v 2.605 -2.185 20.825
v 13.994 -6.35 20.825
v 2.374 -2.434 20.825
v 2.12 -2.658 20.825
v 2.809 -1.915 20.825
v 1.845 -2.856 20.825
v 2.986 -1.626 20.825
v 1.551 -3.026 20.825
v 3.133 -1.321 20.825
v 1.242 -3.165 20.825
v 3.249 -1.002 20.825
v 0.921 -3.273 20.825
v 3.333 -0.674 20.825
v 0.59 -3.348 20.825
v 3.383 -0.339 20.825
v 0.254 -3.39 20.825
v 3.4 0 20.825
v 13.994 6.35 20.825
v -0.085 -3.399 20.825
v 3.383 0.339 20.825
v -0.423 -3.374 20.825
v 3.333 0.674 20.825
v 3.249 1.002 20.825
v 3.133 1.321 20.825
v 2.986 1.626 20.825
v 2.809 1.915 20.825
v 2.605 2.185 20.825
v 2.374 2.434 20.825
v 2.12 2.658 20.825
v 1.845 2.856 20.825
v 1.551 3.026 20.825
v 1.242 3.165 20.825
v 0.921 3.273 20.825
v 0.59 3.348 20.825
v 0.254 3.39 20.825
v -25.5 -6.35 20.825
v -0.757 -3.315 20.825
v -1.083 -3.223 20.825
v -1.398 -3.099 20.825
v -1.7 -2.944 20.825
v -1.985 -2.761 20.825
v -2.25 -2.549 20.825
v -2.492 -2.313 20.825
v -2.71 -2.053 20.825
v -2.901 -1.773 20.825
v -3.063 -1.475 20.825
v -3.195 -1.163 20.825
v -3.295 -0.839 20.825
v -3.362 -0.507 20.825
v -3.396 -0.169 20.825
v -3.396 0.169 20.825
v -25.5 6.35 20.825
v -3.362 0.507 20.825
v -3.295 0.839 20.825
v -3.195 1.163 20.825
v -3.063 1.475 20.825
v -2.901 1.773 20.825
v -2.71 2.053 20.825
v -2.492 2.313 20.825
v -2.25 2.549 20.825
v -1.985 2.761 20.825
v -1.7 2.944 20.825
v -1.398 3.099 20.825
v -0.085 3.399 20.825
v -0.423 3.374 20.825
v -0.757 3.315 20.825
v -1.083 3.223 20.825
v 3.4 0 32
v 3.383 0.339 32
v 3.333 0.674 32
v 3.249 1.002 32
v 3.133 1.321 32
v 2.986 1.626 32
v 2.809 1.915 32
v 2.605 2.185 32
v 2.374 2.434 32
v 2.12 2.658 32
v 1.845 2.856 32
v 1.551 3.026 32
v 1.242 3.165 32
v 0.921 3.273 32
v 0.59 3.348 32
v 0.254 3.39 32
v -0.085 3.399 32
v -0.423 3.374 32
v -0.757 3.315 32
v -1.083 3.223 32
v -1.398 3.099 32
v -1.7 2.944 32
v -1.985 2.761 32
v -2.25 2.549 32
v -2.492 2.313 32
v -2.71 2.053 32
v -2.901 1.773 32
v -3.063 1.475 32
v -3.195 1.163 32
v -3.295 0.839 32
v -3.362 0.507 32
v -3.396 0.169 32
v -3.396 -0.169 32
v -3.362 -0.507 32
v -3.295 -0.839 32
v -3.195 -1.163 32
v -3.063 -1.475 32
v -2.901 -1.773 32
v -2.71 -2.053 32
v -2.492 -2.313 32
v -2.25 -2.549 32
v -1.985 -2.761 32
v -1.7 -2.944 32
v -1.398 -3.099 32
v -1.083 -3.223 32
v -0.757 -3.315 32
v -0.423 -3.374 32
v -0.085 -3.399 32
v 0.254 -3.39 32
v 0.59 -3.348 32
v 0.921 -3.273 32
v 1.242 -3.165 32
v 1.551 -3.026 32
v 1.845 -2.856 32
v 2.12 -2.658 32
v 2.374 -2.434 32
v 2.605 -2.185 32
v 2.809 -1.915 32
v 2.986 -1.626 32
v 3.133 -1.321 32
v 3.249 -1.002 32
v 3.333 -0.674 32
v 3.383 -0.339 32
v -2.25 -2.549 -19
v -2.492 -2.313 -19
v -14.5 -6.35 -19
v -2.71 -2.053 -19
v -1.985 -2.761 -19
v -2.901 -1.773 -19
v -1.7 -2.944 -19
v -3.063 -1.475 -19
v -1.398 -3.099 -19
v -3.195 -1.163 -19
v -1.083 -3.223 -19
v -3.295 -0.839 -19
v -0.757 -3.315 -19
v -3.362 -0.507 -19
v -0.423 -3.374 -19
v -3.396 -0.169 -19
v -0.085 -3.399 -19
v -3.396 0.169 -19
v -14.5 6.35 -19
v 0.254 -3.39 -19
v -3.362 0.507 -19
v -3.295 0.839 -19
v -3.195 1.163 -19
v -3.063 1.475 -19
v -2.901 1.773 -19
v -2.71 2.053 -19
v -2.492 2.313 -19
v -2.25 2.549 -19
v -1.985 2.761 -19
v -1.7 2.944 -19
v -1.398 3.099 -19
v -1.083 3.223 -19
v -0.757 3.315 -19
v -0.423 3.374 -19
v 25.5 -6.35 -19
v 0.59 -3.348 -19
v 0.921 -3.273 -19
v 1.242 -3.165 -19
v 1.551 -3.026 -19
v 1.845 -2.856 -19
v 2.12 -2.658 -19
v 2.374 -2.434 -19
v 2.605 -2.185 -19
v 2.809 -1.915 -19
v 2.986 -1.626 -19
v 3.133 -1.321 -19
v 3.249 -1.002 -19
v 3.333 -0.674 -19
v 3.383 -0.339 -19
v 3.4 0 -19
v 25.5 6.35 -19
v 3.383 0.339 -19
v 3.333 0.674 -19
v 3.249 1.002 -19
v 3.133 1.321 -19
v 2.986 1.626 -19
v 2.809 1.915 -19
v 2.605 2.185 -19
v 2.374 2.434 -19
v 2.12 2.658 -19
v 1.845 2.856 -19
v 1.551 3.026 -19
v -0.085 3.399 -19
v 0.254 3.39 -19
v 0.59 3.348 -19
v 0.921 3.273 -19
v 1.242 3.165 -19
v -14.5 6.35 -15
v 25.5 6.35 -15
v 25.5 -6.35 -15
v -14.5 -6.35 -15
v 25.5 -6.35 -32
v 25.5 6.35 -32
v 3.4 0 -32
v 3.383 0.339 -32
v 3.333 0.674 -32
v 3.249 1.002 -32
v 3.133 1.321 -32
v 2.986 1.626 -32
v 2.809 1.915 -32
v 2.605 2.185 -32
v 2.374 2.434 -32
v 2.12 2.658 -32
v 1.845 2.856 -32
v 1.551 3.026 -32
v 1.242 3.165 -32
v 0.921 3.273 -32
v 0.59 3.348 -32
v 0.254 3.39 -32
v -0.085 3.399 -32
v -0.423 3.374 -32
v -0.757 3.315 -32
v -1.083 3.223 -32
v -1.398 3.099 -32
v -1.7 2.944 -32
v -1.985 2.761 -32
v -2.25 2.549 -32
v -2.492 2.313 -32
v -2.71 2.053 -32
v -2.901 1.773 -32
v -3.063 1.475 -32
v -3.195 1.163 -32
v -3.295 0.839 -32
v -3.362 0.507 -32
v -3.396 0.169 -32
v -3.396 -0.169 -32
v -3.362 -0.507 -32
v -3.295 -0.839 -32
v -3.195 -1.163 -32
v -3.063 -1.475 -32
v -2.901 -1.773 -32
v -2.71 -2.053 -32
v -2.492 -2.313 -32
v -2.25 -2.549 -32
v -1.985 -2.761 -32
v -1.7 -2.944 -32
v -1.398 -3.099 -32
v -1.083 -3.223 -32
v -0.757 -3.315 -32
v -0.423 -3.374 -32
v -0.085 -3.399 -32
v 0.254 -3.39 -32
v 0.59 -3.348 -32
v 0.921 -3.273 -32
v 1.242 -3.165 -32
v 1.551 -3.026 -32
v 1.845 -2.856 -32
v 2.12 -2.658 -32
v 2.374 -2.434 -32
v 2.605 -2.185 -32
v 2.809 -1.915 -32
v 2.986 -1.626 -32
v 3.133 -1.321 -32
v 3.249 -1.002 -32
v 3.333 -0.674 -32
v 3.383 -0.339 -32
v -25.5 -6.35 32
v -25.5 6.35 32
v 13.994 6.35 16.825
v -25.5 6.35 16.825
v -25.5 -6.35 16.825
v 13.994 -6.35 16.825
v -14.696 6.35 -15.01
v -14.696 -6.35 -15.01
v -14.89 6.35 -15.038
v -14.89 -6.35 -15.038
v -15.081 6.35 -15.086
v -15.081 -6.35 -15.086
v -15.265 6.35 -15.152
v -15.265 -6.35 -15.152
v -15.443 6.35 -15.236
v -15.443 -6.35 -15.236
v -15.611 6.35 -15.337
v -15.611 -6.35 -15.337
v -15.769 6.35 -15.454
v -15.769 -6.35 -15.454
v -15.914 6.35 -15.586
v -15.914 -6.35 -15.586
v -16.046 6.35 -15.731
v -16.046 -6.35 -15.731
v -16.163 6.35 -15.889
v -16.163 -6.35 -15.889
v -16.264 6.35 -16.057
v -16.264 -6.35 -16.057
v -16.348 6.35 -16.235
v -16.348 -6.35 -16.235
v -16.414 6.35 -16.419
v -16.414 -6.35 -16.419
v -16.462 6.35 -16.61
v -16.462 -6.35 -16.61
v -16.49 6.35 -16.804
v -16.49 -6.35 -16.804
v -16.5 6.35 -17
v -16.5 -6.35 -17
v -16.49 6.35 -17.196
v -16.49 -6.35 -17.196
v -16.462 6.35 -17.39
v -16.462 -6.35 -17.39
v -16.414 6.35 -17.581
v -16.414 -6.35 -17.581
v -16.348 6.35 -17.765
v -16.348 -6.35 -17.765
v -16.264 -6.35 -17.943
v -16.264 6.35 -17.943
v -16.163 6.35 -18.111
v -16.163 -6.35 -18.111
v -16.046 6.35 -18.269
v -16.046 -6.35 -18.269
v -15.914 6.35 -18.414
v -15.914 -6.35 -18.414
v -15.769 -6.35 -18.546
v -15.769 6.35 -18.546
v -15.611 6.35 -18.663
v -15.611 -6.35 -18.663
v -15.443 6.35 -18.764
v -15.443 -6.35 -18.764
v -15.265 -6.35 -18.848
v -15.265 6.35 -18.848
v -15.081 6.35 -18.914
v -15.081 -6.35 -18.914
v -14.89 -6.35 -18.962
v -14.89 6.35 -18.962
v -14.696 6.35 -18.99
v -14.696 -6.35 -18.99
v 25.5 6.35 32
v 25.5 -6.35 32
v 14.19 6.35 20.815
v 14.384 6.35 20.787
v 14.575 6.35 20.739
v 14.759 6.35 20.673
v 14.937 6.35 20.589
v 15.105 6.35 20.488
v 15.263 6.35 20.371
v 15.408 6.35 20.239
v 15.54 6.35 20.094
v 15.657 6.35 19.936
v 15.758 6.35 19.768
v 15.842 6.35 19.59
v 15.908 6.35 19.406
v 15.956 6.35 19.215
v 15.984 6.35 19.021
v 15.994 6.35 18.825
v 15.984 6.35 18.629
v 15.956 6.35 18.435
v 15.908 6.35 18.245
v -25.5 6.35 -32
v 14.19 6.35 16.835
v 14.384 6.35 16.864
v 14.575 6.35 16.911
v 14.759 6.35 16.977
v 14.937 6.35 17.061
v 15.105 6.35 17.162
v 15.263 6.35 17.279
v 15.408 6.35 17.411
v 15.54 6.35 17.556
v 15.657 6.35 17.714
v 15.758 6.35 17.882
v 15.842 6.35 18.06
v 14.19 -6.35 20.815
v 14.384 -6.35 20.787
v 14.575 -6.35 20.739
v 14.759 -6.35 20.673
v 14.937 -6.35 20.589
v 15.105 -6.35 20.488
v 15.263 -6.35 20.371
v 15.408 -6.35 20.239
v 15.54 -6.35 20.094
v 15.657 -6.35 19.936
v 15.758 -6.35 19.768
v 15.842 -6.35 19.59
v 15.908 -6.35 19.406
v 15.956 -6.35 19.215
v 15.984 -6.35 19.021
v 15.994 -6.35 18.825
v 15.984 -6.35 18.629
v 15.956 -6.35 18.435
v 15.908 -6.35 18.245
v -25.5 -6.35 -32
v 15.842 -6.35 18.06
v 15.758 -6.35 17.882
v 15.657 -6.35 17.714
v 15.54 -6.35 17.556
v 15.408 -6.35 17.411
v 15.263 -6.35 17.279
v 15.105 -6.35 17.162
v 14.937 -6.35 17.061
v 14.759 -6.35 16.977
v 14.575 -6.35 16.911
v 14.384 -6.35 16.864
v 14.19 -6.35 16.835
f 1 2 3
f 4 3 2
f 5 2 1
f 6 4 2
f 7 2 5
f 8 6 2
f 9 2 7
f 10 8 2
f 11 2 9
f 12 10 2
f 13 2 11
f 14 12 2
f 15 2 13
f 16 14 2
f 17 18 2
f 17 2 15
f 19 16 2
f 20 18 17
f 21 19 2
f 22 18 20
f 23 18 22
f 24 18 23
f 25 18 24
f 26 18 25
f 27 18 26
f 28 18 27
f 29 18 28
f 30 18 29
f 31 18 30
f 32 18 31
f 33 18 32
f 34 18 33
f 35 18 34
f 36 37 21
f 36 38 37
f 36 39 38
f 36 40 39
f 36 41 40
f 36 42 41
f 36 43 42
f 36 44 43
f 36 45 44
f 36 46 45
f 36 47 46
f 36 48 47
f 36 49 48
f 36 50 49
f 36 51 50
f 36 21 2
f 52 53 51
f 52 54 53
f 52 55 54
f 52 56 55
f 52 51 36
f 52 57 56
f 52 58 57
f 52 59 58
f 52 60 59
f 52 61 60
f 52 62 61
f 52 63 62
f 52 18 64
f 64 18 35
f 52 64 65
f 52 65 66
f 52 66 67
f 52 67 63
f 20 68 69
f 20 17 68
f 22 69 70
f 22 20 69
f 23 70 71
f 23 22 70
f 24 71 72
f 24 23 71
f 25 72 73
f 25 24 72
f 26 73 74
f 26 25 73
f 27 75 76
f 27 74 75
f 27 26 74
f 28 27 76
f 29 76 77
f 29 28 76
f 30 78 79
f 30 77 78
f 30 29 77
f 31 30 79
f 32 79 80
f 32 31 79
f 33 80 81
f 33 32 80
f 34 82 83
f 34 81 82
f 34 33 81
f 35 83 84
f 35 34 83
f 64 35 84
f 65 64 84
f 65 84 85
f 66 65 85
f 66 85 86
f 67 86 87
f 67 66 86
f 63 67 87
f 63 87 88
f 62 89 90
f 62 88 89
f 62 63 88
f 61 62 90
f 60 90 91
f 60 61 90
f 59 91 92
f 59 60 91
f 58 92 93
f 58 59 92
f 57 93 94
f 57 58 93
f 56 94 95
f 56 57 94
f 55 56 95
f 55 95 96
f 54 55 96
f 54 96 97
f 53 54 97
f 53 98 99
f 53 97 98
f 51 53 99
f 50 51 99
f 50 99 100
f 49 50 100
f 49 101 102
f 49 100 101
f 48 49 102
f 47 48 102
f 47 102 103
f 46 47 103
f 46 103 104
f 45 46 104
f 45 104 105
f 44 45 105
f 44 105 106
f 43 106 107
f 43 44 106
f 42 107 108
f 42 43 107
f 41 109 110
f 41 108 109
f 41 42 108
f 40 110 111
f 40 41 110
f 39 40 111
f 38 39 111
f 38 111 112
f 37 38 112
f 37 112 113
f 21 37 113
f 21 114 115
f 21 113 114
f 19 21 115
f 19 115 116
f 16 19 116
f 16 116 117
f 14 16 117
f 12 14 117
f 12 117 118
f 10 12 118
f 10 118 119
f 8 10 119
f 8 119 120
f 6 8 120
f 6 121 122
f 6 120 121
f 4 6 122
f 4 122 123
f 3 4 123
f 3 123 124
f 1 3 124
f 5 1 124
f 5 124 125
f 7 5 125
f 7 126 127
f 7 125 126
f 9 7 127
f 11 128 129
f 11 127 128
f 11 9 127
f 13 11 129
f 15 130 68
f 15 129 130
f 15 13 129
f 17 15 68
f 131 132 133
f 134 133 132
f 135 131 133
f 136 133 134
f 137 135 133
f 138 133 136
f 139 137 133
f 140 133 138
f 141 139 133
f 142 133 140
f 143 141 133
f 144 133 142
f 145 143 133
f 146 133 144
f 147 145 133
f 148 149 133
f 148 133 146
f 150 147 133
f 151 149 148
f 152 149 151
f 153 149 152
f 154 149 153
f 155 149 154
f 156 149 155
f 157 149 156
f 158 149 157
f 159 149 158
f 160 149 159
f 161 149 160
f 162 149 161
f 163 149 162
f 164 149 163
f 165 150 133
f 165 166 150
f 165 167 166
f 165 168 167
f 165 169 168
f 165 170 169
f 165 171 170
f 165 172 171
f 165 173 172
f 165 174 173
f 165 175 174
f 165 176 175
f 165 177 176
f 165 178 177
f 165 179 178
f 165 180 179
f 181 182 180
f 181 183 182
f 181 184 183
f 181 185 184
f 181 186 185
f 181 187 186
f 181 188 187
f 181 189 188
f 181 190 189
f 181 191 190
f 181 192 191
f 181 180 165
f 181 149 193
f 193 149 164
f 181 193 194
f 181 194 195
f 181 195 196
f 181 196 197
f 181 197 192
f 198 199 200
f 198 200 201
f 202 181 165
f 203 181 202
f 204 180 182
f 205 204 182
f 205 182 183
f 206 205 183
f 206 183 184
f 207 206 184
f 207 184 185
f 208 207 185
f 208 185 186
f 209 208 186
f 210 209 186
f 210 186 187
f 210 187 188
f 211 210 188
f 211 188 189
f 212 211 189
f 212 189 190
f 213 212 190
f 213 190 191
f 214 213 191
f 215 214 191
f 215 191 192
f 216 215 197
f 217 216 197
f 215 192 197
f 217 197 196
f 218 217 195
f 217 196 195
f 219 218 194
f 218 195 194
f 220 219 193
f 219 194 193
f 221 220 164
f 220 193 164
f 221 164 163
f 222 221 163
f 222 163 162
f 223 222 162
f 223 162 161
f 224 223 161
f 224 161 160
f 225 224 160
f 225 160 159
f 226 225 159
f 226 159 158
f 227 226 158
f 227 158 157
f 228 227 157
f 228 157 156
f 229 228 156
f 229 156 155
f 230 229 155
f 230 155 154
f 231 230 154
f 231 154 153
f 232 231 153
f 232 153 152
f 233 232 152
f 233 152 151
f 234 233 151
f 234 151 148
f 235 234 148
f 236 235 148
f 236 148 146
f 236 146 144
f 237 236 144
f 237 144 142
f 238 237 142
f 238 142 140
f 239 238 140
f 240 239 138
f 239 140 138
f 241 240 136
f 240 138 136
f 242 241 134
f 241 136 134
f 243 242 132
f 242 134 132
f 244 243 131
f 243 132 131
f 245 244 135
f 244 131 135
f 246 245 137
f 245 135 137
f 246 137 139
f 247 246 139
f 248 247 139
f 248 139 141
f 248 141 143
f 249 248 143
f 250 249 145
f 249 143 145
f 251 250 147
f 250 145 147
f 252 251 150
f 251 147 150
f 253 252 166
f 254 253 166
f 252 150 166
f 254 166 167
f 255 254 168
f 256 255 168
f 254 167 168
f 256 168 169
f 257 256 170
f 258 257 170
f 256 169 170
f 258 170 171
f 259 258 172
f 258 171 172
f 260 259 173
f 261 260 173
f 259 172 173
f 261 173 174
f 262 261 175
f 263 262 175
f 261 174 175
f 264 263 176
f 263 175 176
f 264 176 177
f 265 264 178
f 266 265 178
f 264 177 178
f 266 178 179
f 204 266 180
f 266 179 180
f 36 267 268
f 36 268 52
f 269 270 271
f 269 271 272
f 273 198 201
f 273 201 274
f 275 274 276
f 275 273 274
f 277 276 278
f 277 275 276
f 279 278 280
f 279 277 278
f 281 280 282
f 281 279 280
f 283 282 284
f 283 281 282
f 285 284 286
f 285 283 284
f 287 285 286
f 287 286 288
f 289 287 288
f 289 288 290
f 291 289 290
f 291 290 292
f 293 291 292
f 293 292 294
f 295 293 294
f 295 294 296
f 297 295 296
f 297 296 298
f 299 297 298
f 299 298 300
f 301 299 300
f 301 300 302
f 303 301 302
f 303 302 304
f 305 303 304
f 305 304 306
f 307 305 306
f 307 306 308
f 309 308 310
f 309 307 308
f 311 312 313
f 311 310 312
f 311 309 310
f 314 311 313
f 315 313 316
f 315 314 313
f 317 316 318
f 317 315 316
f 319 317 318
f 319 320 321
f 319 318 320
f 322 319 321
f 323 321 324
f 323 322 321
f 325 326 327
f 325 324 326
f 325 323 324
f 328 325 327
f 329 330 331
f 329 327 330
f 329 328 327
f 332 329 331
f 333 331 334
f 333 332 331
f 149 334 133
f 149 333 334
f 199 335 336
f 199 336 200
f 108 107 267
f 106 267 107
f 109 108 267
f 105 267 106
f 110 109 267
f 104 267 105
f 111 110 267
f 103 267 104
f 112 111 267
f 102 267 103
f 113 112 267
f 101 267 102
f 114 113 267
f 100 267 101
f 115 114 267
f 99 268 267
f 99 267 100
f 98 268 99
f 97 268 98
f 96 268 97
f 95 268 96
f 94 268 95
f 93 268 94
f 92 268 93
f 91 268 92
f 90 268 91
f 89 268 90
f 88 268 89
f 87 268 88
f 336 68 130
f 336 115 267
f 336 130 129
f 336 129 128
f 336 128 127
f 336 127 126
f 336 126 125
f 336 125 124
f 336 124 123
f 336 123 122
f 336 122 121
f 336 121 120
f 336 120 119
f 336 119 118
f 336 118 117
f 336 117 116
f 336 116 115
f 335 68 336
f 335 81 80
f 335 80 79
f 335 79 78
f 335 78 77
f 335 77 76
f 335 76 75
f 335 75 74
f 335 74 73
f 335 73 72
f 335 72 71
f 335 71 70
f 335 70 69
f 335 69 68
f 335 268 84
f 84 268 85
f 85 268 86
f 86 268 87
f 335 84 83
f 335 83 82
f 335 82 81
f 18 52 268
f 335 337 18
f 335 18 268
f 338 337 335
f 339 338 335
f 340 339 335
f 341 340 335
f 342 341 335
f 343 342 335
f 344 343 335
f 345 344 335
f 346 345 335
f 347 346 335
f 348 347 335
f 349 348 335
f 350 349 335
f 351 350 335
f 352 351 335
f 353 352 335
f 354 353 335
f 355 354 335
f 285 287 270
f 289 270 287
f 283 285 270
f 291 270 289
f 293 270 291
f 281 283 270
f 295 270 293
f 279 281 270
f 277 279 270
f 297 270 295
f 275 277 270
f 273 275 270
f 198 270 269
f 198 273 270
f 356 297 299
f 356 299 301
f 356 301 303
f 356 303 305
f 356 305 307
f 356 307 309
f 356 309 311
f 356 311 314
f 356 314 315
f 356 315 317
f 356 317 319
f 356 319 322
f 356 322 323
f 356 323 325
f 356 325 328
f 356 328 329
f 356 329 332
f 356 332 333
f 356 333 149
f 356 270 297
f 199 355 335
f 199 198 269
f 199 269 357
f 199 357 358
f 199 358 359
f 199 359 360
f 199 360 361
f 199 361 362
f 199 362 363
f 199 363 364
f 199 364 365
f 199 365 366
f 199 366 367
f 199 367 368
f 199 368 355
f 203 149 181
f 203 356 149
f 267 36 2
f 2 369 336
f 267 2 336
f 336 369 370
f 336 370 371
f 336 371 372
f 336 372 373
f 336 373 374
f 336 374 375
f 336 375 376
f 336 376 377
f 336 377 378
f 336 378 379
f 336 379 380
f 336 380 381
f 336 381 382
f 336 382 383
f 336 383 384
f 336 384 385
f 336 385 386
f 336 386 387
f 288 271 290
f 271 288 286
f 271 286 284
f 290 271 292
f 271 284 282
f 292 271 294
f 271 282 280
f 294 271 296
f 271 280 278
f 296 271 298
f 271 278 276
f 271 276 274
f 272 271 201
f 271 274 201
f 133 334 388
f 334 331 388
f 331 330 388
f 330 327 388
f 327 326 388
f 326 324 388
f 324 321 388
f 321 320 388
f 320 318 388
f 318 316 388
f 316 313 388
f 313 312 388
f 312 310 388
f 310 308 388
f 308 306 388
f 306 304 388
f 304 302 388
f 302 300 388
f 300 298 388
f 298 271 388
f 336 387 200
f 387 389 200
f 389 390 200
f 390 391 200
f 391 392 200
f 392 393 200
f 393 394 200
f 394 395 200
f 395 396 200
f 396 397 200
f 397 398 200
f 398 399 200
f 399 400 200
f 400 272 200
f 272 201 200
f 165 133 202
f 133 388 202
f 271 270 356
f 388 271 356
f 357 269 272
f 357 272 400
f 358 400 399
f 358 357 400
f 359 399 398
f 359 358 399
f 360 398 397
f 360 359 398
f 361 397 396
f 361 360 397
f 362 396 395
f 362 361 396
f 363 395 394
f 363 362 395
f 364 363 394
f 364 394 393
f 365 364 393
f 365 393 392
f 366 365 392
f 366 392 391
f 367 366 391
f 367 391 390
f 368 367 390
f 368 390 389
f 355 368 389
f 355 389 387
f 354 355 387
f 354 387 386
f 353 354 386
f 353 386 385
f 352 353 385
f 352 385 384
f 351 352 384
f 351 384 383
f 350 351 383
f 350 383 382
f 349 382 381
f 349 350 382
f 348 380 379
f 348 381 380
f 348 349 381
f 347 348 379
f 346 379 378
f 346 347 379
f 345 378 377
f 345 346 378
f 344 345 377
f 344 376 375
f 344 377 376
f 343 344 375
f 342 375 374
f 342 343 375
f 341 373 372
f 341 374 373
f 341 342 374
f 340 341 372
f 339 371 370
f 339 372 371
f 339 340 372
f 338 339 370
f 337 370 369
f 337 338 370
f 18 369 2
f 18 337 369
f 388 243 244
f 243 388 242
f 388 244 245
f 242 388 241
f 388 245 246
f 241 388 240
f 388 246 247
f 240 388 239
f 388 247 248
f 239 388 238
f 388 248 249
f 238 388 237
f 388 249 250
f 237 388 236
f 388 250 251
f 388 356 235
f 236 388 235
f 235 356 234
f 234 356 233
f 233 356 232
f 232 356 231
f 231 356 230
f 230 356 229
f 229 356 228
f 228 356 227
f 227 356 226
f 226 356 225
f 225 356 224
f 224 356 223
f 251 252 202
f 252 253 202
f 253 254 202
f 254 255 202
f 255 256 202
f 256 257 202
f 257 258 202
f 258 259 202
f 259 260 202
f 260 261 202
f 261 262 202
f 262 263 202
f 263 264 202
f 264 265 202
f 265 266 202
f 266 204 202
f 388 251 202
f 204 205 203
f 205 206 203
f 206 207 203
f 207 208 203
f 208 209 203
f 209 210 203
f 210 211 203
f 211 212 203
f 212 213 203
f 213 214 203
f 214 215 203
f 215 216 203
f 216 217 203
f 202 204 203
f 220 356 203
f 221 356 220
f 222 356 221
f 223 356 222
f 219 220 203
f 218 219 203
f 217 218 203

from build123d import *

# Parameters (mm, degrees)
SKETCH_1_W               = 51
SKETCH_1_H               = 64
EXTRUDE_1_DEPTH          = 6.35
CUT_EXTRUDE_1_DEPTH      = 43.843202495
PATTERN_CIRCULAR_1_COUNT = 2
HOLE_WIZARD_M8_1_D       = 6.8
HOLE_WIZARD_M8_1_DEPTH   = 13


with BuildPart() as part:
    # 草图1 → 凸台-拉伸1 (new, symmetric)
    with BuildSketch(Plane(origin=(0, 0, 0), x_dir=(1, 0, 0), z_dir=(0, 1, 0))):
        Rectangle(SKETCH_1_W, SKETCH_1_H)
    extrude(amount=EXTRUDE_1_DEPTH, both=True)

    # 草图2 → 切除-拉伸1 (cut, through all)
    with BuildSketch(Plane(origin=(0, 6.35, 0), x_dir=(1, 0, 0), z_dir=(0, 1, 0))):
        with BuildLine():
            Line((25.5, 15), (-14.5, 15))
            ThreePointArc((-14.5, 15), (-16.5, 17), (-14.5, 19))
            Line((-14.5, 19), (25.5, 19))
            ThreePointArc((25.5, 19), (27.5, 17), (25.5, 15))
        make_face()
    cut_extrude_1 = extrude(amount=-CUT_EXTRUDE_1_DEPTH, mode=Mode.SUBTRACT)

    # 阵列(圆周)1: 切除-拉伸1 ×2 about axis
    pattern_circular_1_axis = Axis((-0.252947744, 0, 0.912547634), (0, 1, 0))
    for i in range(1, PATTERN_CIRCULAR_1_COUNT):
        add(cut_extrude_1.rotate(pattern_circular_1_axis, i * 360 / PATTERN_CIRCULAR_1_COUNT), mode=Mode.SUBTRACT)

    # M8 螺纹孔1
    with Locations(Plane(origin=(0, 0, -32), x_dir=(-1, 0, 0), z_dir=(0, 0, -1))):
        with Locations((0, 0)):
            hole_wizard_m8_1 = Hole(HOLE_WIZARD_M8_1_D / 2, depth=HOLE_WIZARD_M8_1_DEPTH)

    # 镜向1: M8 螺纹孔1 across plane
    add(hole_wizard_m8_1.mirror(Plane.XY), mode=Mode.SUBTRACT)


solid = part.part
